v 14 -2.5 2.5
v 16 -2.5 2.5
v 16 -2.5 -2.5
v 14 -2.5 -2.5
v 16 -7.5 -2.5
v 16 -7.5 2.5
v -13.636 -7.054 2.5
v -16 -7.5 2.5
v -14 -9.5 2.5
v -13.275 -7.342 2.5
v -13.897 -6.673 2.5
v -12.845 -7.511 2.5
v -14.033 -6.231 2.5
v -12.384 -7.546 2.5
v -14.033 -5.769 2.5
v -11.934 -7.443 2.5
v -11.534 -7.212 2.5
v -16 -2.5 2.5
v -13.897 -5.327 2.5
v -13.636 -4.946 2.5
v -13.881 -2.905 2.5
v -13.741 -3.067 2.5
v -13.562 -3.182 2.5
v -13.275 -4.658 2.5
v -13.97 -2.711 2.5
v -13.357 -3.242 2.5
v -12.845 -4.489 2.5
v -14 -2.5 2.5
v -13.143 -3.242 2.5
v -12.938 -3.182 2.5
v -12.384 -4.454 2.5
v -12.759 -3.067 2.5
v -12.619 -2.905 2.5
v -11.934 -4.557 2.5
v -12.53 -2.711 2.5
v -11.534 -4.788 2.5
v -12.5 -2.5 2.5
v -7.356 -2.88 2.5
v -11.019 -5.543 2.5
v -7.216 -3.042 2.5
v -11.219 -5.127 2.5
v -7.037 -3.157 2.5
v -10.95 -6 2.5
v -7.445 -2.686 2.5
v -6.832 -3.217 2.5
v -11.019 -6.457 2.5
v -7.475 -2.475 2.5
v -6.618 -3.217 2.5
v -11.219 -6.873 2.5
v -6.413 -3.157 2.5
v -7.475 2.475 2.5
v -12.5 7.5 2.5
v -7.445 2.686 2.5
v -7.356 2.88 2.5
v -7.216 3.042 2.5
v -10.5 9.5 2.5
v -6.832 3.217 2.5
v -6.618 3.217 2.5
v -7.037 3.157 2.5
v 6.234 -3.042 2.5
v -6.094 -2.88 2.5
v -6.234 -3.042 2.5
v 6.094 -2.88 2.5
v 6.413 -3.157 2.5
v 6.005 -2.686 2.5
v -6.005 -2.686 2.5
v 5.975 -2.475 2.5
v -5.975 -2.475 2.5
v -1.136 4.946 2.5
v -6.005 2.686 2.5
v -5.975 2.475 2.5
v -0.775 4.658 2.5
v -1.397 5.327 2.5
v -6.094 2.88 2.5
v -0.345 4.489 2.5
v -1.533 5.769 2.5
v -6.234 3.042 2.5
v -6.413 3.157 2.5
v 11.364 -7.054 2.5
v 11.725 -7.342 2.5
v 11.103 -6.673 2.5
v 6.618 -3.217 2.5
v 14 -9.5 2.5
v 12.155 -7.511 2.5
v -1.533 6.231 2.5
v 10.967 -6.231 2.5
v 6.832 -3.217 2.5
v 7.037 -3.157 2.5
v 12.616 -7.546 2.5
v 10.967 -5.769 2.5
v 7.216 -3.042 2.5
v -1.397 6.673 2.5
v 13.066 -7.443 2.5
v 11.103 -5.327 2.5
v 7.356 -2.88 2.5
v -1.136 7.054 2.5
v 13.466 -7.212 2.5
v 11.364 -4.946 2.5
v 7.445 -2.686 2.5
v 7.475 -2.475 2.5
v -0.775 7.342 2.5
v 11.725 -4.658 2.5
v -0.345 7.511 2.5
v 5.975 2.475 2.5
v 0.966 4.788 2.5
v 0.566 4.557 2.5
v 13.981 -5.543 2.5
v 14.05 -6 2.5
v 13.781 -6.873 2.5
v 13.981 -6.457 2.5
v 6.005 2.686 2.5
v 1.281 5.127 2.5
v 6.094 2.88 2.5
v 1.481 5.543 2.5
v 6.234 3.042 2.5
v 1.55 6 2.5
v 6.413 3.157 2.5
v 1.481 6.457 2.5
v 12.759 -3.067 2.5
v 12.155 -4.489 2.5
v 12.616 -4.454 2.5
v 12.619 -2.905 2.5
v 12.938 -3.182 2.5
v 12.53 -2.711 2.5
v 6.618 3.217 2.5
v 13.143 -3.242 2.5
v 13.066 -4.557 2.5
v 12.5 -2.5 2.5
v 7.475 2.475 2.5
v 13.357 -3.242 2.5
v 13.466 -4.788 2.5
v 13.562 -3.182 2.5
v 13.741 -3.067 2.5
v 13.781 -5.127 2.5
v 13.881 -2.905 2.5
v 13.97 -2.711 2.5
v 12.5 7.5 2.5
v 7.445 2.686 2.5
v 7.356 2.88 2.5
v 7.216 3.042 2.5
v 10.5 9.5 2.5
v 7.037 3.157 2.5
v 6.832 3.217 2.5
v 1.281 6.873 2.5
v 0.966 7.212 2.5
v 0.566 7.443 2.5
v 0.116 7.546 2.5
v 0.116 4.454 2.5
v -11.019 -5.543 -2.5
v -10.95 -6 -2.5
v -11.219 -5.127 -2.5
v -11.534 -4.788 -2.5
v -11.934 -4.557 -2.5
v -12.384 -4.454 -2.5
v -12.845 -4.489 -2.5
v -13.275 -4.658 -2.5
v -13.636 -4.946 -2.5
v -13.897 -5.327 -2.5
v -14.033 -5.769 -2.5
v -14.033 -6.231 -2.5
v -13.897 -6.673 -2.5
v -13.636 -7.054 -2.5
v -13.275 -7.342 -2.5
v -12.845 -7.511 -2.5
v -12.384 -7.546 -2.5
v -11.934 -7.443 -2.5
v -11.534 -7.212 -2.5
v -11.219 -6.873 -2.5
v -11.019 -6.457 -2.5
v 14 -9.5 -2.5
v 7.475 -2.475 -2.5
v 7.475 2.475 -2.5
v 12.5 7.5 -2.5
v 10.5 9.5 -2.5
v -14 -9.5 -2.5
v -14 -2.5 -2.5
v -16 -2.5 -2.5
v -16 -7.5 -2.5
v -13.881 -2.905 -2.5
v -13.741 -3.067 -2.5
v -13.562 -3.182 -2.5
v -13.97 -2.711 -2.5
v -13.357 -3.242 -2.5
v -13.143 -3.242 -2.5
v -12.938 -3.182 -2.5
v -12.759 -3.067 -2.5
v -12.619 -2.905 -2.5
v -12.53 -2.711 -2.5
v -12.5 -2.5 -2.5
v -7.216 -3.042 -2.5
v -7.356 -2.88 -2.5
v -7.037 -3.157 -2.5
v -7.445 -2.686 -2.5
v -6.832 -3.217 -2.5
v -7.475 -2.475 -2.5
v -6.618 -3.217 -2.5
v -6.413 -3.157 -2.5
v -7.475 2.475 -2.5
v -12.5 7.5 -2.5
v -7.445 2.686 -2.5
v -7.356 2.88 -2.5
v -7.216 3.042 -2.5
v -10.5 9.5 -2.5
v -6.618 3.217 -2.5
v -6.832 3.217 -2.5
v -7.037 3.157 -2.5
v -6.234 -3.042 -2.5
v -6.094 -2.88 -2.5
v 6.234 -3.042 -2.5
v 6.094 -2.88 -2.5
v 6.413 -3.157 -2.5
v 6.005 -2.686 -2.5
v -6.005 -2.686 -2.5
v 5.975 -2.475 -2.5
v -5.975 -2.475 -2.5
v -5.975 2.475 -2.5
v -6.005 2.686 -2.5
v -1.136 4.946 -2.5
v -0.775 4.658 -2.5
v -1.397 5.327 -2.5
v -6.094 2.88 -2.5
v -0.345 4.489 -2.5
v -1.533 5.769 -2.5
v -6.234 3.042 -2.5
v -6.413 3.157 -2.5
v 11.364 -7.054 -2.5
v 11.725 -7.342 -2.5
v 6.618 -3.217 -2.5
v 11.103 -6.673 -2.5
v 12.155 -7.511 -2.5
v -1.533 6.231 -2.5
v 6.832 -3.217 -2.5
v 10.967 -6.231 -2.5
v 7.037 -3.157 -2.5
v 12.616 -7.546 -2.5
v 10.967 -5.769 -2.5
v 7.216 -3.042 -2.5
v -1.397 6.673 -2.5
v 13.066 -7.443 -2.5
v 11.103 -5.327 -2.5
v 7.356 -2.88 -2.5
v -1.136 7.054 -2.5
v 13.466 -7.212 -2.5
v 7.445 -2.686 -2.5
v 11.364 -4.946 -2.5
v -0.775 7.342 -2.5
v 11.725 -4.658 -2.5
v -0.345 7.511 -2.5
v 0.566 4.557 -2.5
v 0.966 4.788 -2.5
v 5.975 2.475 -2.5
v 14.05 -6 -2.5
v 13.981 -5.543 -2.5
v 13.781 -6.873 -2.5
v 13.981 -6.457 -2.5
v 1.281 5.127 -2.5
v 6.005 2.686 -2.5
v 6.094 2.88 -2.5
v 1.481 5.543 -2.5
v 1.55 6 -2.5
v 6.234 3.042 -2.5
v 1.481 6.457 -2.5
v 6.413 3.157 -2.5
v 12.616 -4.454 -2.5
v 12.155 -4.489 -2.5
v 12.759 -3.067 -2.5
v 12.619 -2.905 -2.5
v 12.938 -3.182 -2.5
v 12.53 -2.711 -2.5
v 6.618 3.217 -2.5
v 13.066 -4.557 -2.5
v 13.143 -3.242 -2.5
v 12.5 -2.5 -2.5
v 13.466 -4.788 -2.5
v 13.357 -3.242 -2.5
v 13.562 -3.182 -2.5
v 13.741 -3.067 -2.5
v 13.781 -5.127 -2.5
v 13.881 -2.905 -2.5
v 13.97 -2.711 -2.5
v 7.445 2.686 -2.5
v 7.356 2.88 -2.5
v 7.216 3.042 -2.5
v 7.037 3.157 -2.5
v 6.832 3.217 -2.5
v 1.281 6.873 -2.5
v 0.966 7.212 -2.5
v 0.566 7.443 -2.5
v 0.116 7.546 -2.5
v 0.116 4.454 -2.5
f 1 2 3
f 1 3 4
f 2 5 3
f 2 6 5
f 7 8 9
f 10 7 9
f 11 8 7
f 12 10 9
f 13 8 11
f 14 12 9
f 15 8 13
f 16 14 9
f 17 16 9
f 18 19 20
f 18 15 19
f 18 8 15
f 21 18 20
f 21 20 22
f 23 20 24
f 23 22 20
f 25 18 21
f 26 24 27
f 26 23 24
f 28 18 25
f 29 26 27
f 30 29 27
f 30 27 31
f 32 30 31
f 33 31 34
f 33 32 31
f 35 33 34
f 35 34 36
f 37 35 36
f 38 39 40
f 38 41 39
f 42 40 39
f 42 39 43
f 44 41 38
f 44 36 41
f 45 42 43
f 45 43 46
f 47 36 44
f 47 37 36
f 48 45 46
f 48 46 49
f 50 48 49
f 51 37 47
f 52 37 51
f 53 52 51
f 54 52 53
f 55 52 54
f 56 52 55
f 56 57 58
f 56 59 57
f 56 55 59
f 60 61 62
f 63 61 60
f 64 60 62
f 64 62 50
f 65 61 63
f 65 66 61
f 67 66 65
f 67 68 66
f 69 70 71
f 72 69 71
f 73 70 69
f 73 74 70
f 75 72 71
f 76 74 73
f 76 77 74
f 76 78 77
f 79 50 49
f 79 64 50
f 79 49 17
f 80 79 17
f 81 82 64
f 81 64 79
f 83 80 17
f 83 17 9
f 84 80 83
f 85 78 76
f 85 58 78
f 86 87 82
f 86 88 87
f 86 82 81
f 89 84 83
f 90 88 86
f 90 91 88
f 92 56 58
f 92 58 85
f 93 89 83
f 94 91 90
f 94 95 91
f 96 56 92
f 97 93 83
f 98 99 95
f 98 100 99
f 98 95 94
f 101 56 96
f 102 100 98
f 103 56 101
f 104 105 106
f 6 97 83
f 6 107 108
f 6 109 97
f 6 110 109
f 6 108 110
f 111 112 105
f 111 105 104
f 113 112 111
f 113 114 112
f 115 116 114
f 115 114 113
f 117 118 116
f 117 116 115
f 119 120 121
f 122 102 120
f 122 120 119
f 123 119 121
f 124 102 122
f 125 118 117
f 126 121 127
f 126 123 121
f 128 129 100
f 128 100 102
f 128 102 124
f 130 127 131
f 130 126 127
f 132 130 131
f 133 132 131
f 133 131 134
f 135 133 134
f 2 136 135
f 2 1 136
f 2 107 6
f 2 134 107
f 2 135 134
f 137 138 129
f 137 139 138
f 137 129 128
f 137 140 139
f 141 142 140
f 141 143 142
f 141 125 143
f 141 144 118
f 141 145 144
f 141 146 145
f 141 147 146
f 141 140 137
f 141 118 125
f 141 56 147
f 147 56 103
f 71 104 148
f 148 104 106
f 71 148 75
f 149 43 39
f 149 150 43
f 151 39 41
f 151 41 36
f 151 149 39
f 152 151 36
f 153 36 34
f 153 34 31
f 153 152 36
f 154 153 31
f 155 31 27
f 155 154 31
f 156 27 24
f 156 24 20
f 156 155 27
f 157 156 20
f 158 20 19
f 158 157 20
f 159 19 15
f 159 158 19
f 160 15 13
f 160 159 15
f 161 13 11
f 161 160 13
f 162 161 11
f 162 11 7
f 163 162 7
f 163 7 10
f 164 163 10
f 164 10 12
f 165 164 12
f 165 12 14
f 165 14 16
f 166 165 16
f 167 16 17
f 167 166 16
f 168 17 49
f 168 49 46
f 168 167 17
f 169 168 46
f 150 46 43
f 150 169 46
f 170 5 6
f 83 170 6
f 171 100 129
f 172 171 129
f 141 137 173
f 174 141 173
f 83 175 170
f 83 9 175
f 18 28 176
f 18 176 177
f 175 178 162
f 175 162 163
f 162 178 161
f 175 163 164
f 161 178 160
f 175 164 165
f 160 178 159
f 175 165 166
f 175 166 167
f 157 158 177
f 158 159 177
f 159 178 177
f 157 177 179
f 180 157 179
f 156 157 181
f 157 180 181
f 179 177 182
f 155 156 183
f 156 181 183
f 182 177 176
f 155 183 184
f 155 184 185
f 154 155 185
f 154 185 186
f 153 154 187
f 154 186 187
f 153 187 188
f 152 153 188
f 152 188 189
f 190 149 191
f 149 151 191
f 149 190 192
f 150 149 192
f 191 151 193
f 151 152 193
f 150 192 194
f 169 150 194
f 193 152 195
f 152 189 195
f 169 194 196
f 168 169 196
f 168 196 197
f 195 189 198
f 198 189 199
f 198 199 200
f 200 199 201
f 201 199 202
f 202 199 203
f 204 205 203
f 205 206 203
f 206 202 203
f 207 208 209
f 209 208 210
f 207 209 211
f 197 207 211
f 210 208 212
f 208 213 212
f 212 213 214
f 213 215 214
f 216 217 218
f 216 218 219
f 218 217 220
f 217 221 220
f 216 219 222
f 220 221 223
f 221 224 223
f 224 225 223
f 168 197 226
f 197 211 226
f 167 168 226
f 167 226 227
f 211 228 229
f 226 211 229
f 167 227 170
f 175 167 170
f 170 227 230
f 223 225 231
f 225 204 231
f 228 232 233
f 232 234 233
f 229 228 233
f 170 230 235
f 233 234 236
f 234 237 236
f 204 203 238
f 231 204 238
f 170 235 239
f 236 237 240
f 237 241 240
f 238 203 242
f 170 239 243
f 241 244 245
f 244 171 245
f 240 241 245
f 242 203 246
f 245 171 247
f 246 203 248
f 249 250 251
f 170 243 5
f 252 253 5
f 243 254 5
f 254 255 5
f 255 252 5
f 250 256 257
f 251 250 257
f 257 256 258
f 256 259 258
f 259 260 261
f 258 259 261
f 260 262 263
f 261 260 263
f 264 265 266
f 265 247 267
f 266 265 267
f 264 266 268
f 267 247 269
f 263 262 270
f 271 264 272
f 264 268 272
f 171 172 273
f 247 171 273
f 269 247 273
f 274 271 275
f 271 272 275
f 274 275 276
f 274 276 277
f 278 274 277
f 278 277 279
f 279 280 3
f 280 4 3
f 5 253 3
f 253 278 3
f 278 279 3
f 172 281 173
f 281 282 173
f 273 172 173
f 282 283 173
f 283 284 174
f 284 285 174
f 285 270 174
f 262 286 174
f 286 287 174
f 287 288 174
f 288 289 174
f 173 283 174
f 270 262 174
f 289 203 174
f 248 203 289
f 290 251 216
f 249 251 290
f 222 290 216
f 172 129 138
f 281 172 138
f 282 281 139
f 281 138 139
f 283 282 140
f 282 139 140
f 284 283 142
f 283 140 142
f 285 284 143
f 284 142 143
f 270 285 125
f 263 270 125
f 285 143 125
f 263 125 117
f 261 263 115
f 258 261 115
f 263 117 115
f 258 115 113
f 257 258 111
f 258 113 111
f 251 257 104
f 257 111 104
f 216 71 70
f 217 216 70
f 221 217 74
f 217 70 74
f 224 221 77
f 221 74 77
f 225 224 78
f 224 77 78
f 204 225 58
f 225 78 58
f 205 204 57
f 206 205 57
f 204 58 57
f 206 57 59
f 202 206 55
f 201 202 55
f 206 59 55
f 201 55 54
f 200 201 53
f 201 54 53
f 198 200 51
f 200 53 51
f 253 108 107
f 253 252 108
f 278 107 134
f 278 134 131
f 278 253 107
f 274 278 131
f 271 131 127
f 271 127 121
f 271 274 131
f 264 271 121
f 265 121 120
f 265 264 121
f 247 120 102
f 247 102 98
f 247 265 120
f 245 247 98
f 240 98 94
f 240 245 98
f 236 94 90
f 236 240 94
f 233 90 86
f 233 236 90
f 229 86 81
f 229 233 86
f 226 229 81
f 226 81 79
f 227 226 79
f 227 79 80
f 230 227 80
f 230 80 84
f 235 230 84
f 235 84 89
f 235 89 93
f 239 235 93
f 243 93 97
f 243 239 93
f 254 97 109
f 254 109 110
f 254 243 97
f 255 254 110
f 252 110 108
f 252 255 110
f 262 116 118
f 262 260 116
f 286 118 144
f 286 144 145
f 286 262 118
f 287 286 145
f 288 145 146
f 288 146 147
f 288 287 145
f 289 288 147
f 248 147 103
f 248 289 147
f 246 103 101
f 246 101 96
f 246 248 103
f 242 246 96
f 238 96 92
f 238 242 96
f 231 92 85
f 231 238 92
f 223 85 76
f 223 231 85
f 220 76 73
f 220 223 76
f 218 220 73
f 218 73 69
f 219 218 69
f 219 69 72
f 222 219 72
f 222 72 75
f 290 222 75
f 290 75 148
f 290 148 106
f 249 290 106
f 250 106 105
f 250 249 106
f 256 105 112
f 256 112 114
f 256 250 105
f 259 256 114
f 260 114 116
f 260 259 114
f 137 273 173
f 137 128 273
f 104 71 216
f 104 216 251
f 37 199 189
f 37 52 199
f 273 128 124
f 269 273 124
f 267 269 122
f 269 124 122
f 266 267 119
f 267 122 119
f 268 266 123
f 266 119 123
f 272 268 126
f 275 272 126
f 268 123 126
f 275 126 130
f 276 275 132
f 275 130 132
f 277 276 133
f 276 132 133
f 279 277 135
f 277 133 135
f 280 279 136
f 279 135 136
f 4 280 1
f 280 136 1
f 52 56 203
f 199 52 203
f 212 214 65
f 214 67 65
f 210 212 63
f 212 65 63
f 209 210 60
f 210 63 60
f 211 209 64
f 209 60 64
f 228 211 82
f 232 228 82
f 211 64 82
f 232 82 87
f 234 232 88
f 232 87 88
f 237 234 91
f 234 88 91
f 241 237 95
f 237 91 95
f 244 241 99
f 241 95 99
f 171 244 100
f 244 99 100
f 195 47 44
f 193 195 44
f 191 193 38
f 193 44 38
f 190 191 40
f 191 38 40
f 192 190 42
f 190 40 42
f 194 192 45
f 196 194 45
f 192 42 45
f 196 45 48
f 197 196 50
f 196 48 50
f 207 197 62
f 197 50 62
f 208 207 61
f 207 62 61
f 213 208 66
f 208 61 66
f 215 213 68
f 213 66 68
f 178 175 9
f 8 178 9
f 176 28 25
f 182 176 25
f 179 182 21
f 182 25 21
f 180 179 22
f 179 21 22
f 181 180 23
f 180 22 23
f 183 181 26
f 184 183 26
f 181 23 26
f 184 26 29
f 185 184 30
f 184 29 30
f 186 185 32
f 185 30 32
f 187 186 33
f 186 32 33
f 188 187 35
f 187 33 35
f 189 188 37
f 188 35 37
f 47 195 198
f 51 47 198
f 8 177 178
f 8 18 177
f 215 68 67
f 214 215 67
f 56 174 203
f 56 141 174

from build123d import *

# Parameters (mm, degrees)
SKETCH_1_R          = 1.55
SKETCH_1_W          = 14.95
SKETCH_1_H          = 4.95
EXTRUDE_1_DEPTH     = 2.5
SKETCH_2_R          = 0.75
CUT_EXTRUDE_1_DEPTH = 6
CHAMFER_1_SIZE      = 2


with BuildPart() as part:
    # 草图1 → 凸台-拉伸1 (new body, symmetric)
    with BuildSketch(Plane.XY):
        Polygon((-16, -2.5), (-16, -9.5), (16, -9.5), (16, -2.5), (12.5, -2.5), (12.5, 9.5), (-12.5, 9.5), (-12.5, -2.5), align=None)
        with Locations((-12.5, -6)):
            Circle(SKETCH_1_R, mode=Mode.SUBTRACT)
        with Locations((12.5, -6)):
            Circle(SKETCH_1_R, mode=Mode.SUBTRACT)
        with Locations((0, 6)):
            Circle(SKETCH_1_R, mode=Mode.SUBTRACT)
        Rectangle(SKETCH_1_W, SKETCH_1_H, mode=Mode.SUBTRACT)
    extrude(amount=EXTRUDE_1_DEPTH, both=True)

    # 草图2 → 切除-拉伸1 (cut, through all)
    with BuildSketch(Plane.XY.offset(2.5)):
        with Locations((-13.25, -2.5)):
            Circle(SKETCH_2_R)
        with Locations((-6.725, -2.475)):
            Circle(SKETCH_2_R)
        with Locations((-6.725, 2.475)):
            Circle(SKETCH_2_R)
        with Locations((6.725, 2.475)):
            Circle(SKETCH_2_R)
        with Locations((6.725, -2.475)):
            Circle(SKETCH_2_R)
        with Locations((13.25, -2.5)):
            Circle(SKETCH_2_R)
    extrude(amount=-CUT_EXTRUDE_1_DEPTH, mode=Mode.SUBTRACT)

    # 倒角1
    chamfer_1_edges = [part.edges().sort_by_distance(p)[0] for p in [
        (-16, -9.5, 0),
        (-12.5, 9.5, 0),
        (12.5, 9.5, 0),
        (16, -9.5, 0),
    ]]
    chamfer(chamfer_1_edges, length=CHAMFER_1_SIZE)


solid = part.part
